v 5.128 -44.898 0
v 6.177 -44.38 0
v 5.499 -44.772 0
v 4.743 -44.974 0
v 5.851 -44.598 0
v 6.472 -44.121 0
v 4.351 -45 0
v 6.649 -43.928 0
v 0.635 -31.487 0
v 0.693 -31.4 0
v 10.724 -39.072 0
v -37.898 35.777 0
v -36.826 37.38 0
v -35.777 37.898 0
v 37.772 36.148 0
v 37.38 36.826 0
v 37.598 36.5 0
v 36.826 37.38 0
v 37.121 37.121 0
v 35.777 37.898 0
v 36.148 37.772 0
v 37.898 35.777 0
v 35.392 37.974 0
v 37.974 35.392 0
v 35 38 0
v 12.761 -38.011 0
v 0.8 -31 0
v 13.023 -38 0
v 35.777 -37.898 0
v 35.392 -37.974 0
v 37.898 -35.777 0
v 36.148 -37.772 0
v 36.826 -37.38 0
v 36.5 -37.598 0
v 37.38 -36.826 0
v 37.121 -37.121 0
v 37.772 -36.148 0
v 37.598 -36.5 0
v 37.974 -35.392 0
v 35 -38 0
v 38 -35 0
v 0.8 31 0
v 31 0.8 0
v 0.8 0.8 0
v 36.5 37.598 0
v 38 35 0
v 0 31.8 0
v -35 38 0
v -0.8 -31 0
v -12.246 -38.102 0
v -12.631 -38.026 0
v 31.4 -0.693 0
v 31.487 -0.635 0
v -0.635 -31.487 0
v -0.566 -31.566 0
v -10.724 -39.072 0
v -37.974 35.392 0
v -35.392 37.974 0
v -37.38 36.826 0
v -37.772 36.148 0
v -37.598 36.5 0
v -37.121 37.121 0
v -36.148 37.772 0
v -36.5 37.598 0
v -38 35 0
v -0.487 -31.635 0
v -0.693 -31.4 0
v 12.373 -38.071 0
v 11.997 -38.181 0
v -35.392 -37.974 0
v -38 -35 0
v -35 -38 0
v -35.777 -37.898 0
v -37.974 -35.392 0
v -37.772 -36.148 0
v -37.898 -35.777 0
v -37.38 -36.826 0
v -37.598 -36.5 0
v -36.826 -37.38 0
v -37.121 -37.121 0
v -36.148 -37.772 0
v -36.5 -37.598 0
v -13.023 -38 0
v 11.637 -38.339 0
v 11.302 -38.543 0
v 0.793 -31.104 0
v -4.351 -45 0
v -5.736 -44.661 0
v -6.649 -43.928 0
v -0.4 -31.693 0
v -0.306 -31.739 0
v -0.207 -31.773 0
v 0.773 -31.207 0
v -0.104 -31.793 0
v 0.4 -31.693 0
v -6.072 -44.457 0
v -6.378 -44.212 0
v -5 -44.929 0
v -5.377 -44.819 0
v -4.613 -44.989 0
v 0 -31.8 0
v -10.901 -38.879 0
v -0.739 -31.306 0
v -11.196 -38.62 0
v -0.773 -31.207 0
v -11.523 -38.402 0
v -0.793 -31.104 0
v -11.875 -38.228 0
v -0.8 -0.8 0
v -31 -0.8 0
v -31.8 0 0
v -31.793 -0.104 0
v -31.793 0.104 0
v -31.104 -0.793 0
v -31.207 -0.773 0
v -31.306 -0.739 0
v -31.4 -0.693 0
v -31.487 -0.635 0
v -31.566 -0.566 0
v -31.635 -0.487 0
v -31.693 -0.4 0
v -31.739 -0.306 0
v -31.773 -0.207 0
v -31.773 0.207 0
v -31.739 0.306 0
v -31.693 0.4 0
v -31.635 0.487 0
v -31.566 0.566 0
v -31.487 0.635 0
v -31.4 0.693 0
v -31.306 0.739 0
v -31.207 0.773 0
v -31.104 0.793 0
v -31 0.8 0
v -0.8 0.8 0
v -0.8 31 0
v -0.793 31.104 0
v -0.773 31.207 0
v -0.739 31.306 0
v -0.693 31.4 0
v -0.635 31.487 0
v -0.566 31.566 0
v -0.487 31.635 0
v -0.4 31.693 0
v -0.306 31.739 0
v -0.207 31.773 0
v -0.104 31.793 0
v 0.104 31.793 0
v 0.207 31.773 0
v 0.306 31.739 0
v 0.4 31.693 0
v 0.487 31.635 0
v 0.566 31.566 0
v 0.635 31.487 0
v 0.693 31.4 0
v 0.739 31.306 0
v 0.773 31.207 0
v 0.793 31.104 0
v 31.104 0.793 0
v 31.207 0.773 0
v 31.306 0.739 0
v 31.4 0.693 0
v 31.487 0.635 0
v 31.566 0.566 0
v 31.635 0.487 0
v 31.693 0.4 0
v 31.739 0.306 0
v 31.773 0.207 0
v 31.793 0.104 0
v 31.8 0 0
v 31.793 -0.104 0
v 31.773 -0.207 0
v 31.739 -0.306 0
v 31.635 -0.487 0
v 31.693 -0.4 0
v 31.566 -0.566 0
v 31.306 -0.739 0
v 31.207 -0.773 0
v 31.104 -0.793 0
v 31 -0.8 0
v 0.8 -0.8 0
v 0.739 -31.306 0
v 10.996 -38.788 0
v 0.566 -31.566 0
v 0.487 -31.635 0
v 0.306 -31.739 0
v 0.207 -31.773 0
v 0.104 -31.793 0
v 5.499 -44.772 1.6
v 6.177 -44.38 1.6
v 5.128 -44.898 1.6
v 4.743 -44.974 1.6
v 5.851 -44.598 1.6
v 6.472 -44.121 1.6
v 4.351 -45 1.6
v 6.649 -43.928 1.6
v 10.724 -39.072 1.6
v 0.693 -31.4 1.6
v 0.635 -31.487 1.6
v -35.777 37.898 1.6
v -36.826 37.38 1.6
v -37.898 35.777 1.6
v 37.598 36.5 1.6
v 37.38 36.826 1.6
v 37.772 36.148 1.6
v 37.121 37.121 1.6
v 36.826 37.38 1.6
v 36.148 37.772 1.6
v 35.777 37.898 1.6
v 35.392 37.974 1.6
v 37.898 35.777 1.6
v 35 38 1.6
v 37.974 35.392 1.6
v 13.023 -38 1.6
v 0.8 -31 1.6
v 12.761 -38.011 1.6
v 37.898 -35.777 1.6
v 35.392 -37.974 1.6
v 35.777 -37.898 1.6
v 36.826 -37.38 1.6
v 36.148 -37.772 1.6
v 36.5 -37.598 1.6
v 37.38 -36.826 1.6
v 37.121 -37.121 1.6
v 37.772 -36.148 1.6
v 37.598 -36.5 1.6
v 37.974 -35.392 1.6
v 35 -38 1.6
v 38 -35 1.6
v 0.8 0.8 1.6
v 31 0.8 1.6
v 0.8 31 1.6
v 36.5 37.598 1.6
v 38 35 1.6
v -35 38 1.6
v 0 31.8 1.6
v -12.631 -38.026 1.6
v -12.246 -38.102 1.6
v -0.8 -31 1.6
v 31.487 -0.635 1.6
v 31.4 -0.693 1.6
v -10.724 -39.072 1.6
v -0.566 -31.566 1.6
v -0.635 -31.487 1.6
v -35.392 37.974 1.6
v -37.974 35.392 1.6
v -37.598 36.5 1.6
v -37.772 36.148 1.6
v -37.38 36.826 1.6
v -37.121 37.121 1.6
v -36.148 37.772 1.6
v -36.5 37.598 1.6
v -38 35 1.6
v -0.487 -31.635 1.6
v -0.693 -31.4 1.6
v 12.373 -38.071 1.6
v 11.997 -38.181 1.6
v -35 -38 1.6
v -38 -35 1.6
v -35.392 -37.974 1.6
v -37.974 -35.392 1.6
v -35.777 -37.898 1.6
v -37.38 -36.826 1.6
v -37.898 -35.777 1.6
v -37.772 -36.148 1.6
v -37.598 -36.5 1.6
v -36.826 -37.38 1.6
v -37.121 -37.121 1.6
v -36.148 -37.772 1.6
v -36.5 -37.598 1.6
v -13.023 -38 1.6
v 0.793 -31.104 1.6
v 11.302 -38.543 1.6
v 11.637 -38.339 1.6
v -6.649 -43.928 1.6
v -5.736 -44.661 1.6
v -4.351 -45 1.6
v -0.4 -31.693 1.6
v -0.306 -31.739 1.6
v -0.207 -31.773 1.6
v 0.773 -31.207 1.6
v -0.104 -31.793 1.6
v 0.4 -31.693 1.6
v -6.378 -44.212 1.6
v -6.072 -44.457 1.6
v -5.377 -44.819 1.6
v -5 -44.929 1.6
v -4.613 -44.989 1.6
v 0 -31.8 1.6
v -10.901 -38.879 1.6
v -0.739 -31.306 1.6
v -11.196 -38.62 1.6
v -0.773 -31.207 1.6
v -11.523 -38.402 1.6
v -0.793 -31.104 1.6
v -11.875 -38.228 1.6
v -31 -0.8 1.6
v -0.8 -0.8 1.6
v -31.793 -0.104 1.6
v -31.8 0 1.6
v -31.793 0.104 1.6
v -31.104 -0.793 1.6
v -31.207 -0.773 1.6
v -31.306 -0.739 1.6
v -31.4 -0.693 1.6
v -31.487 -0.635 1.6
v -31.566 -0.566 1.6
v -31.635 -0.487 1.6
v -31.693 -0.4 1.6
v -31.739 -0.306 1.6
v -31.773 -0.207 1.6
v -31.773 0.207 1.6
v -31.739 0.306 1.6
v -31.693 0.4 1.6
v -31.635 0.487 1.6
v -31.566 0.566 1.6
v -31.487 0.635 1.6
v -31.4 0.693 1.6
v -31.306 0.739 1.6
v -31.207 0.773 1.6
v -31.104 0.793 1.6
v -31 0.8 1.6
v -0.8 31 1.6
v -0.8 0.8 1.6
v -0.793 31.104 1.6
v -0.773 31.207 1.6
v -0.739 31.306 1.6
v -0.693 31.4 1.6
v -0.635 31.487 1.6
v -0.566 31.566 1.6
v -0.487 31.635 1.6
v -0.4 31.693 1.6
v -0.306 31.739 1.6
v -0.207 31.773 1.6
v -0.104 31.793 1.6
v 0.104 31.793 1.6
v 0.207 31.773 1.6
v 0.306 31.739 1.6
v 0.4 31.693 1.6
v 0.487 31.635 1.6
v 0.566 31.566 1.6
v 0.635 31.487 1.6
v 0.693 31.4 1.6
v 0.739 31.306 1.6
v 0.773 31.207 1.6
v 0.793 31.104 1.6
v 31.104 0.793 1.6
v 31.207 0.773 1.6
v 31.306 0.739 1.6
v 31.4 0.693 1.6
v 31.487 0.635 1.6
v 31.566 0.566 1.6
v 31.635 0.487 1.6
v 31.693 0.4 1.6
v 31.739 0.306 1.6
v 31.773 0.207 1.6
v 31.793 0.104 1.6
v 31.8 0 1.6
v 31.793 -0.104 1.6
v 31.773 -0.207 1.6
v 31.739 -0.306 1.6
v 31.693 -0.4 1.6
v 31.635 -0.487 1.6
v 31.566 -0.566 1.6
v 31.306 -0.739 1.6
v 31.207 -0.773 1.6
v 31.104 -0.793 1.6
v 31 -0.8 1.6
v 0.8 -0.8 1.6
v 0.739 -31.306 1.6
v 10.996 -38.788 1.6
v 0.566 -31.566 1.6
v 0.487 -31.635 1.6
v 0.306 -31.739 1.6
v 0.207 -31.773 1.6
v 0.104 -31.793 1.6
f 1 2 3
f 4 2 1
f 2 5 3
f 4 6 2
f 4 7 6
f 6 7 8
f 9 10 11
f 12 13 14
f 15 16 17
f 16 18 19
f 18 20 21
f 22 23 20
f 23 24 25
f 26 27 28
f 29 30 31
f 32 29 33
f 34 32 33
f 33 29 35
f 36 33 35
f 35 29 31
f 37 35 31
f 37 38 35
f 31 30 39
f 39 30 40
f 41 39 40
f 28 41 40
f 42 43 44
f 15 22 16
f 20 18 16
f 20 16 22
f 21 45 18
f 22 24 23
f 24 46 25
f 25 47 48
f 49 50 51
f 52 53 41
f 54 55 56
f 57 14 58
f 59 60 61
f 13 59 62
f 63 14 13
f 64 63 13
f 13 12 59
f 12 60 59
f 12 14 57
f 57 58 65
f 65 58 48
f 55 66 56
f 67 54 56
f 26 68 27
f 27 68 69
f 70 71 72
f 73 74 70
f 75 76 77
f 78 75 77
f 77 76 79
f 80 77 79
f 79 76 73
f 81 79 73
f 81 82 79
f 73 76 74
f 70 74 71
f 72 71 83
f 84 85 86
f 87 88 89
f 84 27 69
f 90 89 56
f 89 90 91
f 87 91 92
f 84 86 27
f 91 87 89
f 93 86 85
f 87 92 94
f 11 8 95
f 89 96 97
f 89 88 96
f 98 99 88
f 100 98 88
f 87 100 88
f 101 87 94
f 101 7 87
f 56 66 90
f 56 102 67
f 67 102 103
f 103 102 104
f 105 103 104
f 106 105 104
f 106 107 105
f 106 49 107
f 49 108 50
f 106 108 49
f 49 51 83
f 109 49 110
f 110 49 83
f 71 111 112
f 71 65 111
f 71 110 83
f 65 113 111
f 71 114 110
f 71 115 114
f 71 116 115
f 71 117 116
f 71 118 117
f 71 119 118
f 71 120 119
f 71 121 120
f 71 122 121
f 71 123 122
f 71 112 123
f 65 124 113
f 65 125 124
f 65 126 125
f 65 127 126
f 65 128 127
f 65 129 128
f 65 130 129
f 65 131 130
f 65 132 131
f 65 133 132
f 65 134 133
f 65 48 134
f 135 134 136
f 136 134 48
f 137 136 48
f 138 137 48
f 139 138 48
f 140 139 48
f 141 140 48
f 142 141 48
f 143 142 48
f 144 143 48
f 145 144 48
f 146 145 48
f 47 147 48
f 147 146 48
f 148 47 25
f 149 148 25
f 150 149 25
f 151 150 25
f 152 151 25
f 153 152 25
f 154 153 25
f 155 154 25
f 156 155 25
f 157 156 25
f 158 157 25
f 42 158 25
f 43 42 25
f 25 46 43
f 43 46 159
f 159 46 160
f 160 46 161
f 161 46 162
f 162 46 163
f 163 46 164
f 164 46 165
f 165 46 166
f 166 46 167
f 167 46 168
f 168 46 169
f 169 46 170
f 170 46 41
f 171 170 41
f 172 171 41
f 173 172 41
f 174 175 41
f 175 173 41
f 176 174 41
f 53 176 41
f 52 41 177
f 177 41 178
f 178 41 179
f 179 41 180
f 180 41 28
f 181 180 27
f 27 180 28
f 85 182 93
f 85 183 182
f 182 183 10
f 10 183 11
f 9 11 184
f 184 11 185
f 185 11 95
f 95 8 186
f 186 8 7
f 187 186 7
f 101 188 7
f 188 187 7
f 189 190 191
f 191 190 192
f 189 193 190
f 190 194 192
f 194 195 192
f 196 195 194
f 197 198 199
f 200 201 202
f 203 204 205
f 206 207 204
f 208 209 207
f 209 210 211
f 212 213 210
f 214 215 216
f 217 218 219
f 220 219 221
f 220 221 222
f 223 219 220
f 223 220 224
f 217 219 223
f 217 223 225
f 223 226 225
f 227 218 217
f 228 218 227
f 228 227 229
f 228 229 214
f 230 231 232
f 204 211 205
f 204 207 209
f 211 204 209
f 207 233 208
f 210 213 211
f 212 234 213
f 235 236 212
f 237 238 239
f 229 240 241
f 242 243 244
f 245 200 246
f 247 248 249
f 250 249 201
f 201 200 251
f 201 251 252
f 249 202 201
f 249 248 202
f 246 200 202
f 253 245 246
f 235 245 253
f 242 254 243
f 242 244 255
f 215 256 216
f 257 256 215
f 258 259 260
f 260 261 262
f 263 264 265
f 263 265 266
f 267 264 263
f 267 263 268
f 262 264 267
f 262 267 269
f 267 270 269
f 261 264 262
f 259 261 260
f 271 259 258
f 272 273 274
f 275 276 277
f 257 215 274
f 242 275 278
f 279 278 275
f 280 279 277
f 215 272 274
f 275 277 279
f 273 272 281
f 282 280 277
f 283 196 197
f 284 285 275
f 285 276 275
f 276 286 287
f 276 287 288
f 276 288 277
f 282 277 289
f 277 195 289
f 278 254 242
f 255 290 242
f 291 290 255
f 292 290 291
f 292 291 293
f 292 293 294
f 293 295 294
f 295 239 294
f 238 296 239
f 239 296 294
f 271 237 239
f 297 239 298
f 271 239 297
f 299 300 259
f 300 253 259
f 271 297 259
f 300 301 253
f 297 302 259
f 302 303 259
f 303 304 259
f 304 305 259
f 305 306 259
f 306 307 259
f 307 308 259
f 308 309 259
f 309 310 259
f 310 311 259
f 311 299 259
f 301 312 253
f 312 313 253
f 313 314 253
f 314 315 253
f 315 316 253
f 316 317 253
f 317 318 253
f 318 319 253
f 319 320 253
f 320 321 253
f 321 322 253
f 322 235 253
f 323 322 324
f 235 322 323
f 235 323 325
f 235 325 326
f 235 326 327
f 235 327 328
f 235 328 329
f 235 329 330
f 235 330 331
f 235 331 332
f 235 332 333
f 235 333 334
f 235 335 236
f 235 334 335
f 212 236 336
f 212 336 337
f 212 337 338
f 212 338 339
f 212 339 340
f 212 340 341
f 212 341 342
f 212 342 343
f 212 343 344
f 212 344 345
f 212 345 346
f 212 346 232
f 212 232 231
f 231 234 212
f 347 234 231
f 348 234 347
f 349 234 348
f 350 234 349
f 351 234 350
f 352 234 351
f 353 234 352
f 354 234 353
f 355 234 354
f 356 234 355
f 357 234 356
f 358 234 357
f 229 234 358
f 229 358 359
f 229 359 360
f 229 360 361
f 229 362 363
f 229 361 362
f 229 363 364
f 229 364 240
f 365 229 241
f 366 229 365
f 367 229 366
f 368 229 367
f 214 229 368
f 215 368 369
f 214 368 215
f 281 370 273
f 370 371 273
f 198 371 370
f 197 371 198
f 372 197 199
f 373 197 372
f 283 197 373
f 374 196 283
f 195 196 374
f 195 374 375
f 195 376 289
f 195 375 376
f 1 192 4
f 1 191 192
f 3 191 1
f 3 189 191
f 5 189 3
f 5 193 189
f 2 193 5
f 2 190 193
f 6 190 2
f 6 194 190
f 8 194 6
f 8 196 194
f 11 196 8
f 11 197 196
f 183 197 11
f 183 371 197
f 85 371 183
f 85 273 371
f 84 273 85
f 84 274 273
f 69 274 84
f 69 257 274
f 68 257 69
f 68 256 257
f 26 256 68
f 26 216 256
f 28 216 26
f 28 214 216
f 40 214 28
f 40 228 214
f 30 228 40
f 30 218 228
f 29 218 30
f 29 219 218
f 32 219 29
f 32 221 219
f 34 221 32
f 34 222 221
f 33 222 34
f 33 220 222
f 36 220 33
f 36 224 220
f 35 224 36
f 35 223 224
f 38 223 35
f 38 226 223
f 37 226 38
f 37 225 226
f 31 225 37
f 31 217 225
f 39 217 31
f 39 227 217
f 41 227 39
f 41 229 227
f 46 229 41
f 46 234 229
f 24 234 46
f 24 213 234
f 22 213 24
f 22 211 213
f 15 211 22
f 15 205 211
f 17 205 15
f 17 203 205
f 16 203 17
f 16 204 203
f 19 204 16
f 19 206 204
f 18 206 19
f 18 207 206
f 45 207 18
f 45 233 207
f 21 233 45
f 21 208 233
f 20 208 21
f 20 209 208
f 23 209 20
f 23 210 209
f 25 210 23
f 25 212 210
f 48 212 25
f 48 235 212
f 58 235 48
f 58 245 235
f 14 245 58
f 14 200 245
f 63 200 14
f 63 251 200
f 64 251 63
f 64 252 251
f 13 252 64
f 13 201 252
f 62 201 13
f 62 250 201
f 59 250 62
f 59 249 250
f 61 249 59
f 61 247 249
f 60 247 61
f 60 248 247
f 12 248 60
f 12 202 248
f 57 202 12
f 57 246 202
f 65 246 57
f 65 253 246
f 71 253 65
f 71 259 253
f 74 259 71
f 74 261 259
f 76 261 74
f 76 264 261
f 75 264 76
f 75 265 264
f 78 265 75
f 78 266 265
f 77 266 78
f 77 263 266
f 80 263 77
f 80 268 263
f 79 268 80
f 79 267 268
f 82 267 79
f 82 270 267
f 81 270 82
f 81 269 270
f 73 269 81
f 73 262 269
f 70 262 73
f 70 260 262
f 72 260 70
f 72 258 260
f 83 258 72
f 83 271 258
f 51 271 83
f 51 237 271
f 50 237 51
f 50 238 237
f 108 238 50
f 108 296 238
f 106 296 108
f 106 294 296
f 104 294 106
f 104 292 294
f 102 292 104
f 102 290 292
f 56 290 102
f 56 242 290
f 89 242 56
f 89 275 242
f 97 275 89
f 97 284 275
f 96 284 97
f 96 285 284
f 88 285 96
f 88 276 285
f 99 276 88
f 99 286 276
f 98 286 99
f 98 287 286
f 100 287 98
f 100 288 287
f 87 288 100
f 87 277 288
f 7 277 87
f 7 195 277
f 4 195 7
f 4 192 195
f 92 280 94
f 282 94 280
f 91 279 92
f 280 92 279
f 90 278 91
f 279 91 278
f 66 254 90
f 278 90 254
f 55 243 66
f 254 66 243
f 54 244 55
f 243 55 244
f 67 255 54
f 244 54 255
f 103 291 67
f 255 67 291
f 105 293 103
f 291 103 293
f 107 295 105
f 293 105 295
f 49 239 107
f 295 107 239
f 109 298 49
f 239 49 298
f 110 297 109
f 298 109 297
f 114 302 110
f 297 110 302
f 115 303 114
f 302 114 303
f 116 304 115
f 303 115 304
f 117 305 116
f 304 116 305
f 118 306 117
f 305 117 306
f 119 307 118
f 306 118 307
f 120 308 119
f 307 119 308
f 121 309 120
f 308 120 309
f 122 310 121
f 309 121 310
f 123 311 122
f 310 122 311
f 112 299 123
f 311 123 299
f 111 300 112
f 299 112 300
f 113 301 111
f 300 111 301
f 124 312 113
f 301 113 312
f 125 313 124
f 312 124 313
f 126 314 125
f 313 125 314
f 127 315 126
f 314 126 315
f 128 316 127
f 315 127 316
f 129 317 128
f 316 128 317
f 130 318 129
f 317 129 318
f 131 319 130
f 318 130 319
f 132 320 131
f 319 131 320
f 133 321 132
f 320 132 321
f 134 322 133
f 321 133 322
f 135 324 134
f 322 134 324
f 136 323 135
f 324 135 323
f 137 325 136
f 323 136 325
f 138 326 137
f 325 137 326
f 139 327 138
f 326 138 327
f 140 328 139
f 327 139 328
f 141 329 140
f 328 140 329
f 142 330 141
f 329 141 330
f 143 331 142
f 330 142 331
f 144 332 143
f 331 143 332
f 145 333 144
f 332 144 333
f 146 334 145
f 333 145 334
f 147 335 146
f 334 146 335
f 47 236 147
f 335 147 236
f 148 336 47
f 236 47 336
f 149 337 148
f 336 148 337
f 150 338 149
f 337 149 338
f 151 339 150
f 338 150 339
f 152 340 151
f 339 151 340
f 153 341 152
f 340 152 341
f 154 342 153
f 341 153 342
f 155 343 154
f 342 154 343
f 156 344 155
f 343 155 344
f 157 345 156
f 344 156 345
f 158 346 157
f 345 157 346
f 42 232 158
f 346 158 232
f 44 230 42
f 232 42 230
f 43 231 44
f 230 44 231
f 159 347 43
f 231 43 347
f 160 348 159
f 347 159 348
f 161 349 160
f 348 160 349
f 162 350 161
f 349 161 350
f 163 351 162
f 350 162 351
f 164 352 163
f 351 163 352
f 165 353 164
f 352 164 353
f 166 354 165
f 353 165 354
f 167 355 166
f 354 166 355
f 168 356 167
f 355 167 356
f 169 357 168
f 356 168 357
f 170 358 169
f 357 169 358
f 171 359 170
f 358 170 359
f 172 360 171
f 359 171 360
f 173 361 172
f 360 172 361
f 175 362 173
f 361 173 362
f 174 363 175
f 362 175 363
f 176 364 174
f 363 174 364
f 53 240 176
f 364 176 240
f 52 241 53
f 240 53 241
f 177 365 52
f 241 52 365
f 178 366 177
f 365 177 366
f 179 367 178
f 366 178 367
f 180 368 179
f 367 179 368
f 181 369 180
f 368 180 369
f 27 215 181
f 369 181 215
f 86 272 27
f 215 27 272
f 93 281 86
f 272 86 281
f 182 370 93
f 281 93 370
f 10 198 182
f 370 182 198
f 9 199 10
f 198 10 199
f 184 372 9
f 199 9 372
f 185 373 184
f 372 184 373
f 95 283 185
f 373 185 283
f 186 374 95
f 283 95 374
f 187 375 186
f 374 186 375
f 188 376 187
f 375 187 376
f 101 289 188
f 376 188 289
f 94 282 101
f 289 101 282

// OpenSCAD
// Sticky-note stencils: planners, a week, and grids -- for 3 x 3 inch (76 mm) notes. The
// tab sits on the edge toward you when the stencil lies on the pad; give each stencil in a
// set a different tab position (1 to 5) so all the tabs show when they are stacked.

/* [Stencil] */
// A ready-made stencil, or Custom grid to set the grid below
preset = "planner_quadrants"; // [planner_quadrants:Planner quadrants, planner_focus:Planner focus, planner_pros_cons:Planner pros and cons, planner_two_columns:Planner two columns, planner_two_rows:Planner two rows, week_labelled:Week with day letters, week_grid:Week grid only, grid_dots:Grid dots, grid_graph:Grid graph dots and axes, custom_grid:Custom grid]

/* [Tab] */
// Width across the top of the tab (11.5 lets five positions show; 15 suits three)
tab_width = 11.5; // [8:0.5:30]
// Where along the edge: 1 to 5 (for three tabs use 1, 3 and 5; for one, 3)
tab_position = 3; // [1:1:5]

/* [Print] */
// Stencil thickness (1.6 is 8 layers of 0.2)
thickness = 1.6; // [0.8:0.2:3]
// Width of the pen slots
slot_width = 1.6; // [1:0.1:2.5]

/* [Custom grid] */
// Spacing of the dots
grid_pitch = 5; // [3:0.5:10]
// Dot size
grid_dot = 1.6; // [1:0.1:3]
// Axes through the middle
grid_axes = false;

/* [Hidden] */
// --- stencil-common.scad, inlined by build.py ---
// Sticky-note stencil standard, shared by every generator -- OpenSCAD port of the Python
// prototype (../conform.py: sheet, tab; ../stencilgen.py: slot, box, rows). Keep the two in
// step: build.py renders every preset here and compares it with the prototype's outline.
//
// The standard (owner): a 76 mm square sheet, corners 3; one tab on its bottom edge --
// jorm's angled tab (MakerWorld 1409445, measured from its blank STEPs): 7 deep, sides 50
// degrees off the edge, every corner 3 round -- of a chosen top width at position 1 to 5.
// Bottom, because lying on the pad the tab sticks out toward the user: every pattern is
// drawn upright with its foot toward the tab. The pattern keeps MARGIN inside the edges;
// pen slots are SLOT wide with round ends. Nothing may cut off an island (a closed loop of
// slot, a letter with a counter): it would drop out.
//
// A generator includes this file while being developed; build.py inlines it for upload
// (MakerWorld takes one .scad file).

SQUARE = 76;             // a 3 x 3 inch note
CORNER_R = 3;
TAB_D = 7;               // [jorm]
TAB_ANGLE = 50;          // [jorm] the tab's sides, degrees off the sheet's edge
TAB_R = 3;               // [jorm]
POSITIONS = 5;
MARGIN = 7;
H = SQUARE / 2 - MARGIN; // the pattern's half extent
BOX = 5;                 // a checkbox; LARGE_BOX for the large ones
LARGE_BOX = 8;
GAP = 2;                 // between a box and its line
TITLE_GAP = 5;           // between the title bar and the first row (was 3)
TITLE = 9;               // a title bar's height: room to write in (owner: larger; was 5)

$fn = 48;

// the tab's width where it meets the sheet
function tab_base(w) = w + 2 * TAB_D / tan(TAB_ANGLE);

// position 1 to POSITIONS, evenly spaced for a tab of top width w, the base of 1 and of
// the last just clear of the sheet's corner rounding
function tab_centre(position, w) =
    let(span = SQUARE - 2 * CORNER_R - tab_base(w))
    -span / 2 + span * (position - 1) / (POSITIONS - 1);

// the sheet and its tab, 2D, centred on the origin, the tab on the bottom edge
module sheet(tab_width, tab_position) {
    x = tab_centre(tab_position, tab_width);
    e = -SQUARE / 2;
    b = tab_base(tab_width) / 2;
    t = tab_width / 2;
    // round the concave corners (the tab's foot), after the convex ones
    offset(r = -TAB_R) offset(delta = TAB_R)
    offset(r = CORNER_R) offset(delta = -CORNER_R)
    union() {
        square(SQUARE, center = true);
        polygon([[x - b, e + 1], [x + b, e + 1], [x + b, e], [x + t, e - TAB_D],
                 [x - t, e - TAB_D], [x - b, e]]);
    }
}

// a pen slot from p0 to p1, w wide, round ended
module slot(p0, p1, w) {
    hull() {
        translate(p0) circle(d = w);
        translate(p1) circle(d = w);
    }
}

// a checkbox centred at c: square (corners 0.5), circle, triangle (pointing down) or heart
module box(c, size, shape) {
    translate(c)
    if (shape == "square")
        offset(r = 0.5) square(size - 1, center = true);
    else if (shape == "circle")
        circle(d = size);
    else if (shape == "triangle")
        let(r = size / 2) polygon([[-r, 0.8 * r], [r, 0.8 * r], [0, -r]]);
    else if (shape == "heart")
        let(k = size / 32)
        polygon([for (i = [0 : 63]) let(a = 360 * i / 63)
            [16 * pow(sin(a), 3) * k,
             (13 * cos(a) - 5 * cos(2 * a) - 2 * cos(3 * a) - cos(4 * a)) * k + size * 0.05]]);
}

// n rows' centres, evenly from top to bottom
function rows_y(n, top, bottom) =
    n == 1 ? [(top + bottom) / 2] : [for (k = [0 : n - 1]) top - (top - bottom) * k / (n - 1)];

// a title bar across the top of the pattern
module title_bar() {
    offset(r = 0.8) offset(delta = -0.8) translate([-H, H - TITLE]) square([2 * H, TITLE]);
}

flat = false;            // true: the stencil's outline in 2D (build.py's check), not a part

// the finished stencil: the sheet, the pattern cut out, extruded
module stencil(tab_width, tab_position, thickness) {
    if (flat)
        difference() { sheet(tab_width, tab_position); children(); }
    else
        linear_extrude(thickness) difference() {
            sheet(tab_width, tab_position);
            children();
        }
}


// presets: [name, kind, layout or labels, grid pitch, dot, axes]
PRESETS = [
    ["planner_quadrants", "planner", "quadrants"],
    ["planner_focus", "planner", "focus"],
    ["planner_pros_cons", "planner", "pros-cons"],
    ["planner_two_columns", "planner", "two-columns"],
    ["planner_two_rows", "planner", "two-rows"],
    ["week_labelled", "week", true],
    ["week_grid", "week", false],
    ["grid_dots", "grid", 5, 1.6, false],
    ["grid_graph", "grid", 5, 1.6, true],
];

P = preset == "custom_grid"
    ? ["custom_grid", "grid", grid_pitch, grid_dot, grid_axes]
    : PRESETS[search([preset], PRESETS)[0]];

module v(x, y0 = -H, y1 = H) slot([x, y0], [x, y1], slot_width);
module h(y, x0 = -H, x1 = H) slot([x0, y], [x1, y], slot_width);

module planner_pattern(layout) {
    if (layout == "quadrants") { v(0); h(0); }
    else if (layout == "focus") { v(0, -H, -H / 3); h(-H / 3); }
    else if (layout == "pros-cons") { v(0, -H, H - 8); h(H - 8); }
    else if (layout == "two-columns") v(0);
    else if (layout == "two-rows") h(0);
}

// day letters, drawn as pen strokes slot_width wide, as the lines are (owner, 2026-11-03:
// cut from a bold font at 3.65 their strokes were about 0.6, too narrow for a pen). Each
// glyph is polylines, the strokes' centre lines, on a LETTER_H box of its own width; none
// closes a loop, so nothing drops out. LETTER_GAP of sheet between strokes not joined,
// between letters, and between a letter and a slot.
// The S's ends stop short of its middle (35 and -145 degrees): at 20 and -160 they
// closed its counters at the widest slot (2.5), and those dropped out.
LETTER_H = 6;
LETTER_GAP = 1.2;
function glyph_w(ch) = ch == "M" ? 5.5 : ch == "W" ? 6.5 : ch == "F" ? 3.8 : ch == "S" ? 4.2 : 4.5;
function arc(cx, cy, rx, ry, a0, a1, n = 12) =
    [for (k = [0 : n]) let(a = a0 + (a1 - a0) * k / n) [cx + rx * cos(a), cy + ry * sin(a)]];
function glyph(ch) = let(w = glyph_w(ch), h = LETTER_H)
    ch == "M" ? [[[0, 0], [0, h], [w / 2, h * 0.4], [w, h], [w, 0]]]
  : ch == "T" ? [[[0, h], [w, h]], [[w / 2, h], [w / 2, 0]]]
  : ch == "W" ? [[[0, h], [w / 4, 0], [w / 2, h * 0.6], [3 * w / 4, 0], [w, h]]]
  : ch == "H" ? [[[0, 0], [0, h]], [[w, 0], [w, h]], [[0, h / 2], [w, h / 2]]]
  : ch == "F" ? [[[w, h], [0, h], [0, 0]], [[0, h / 2], [w * 0.8, h / 2]]]
  : ch == "S" ? [concat(arc(w / 2, h * 3 / 4, w / 2, h / 4, 35, 270),
                        [for (q = [1 : 12]) arc(w / 2, h / 4, w / 2, h / 4, 90, -145)[q]])]
  :             [concat([[0, h]], arc(w / 2, w / 2, w / 2, w / 2, 180, 360), [[w, h]])];   // U

// the text's strokes, their top left at (x, y_top)
module lettering(text, x, y_top, i = 0) {
    if (i < len(text)) {
        for (line = glyph(text[i]), k = [0 : len(line) - 2])
            slot([x + line[k][0], y_top - LETTER_H + line[k][1]],
                 [x + line[k + 1][0], y_top - LETTER_H + line[k + 1][1]], slot_width);
        lettering(text, x + glyph_w(text[i]) + slot_width + LETTER_GAP, y_top, i + 1);
    }
}

// a 7-day week: two columns of four, the last cell for notes; day letters in each cell's
// top left, slot_width + LETTER_GAP in from its slots (the sheet's margin for the top and
// left ones)
module week_pattern(labels) {
    v(0);
    for (y = [H / 2, 0, -H / 2]) h(y);
    if (labels) {
        days = ["M", "T", "W", "TH", "F", "S", "SU"];
        cells = [[-H, H], [0, H], [-H, H / 2], [0, H / 2], [-H, 0], [0, 0], [-H, -H / 2]];
        inset = slot_width + LETTER_GAP;
        for (i = [0 : 6]) lettering(days[i], cells[i][0] + inset, cells[i][1] - inset);
    }
}

// dots on a pitch; with axes, a slot each way through the middle
module grid_pattern(pitch, dot, axes) {
    n = floor(2 * H / pitch);
    off = -(n * pitch) / 2;
    for (i = [0 : n], j = [0 : n]) {
        x = off + i * pitch;
        y = off + j * pitch;
        if (!(axes && (abs(x) < 0.01 || abs(y) < 0.01)))
            translate([x, y]) circle(d = dot);
    }
    if (axes) { h(0); v(0); }
}

stencil(tab_width, tab_position, thickness)
    if (P[1] == "planner") planner_pattern(P[2]);
    else if (P[1] == "week") week_pattern(P[2]);
    else grid_pattern(P[2], P[3], P[4]);
